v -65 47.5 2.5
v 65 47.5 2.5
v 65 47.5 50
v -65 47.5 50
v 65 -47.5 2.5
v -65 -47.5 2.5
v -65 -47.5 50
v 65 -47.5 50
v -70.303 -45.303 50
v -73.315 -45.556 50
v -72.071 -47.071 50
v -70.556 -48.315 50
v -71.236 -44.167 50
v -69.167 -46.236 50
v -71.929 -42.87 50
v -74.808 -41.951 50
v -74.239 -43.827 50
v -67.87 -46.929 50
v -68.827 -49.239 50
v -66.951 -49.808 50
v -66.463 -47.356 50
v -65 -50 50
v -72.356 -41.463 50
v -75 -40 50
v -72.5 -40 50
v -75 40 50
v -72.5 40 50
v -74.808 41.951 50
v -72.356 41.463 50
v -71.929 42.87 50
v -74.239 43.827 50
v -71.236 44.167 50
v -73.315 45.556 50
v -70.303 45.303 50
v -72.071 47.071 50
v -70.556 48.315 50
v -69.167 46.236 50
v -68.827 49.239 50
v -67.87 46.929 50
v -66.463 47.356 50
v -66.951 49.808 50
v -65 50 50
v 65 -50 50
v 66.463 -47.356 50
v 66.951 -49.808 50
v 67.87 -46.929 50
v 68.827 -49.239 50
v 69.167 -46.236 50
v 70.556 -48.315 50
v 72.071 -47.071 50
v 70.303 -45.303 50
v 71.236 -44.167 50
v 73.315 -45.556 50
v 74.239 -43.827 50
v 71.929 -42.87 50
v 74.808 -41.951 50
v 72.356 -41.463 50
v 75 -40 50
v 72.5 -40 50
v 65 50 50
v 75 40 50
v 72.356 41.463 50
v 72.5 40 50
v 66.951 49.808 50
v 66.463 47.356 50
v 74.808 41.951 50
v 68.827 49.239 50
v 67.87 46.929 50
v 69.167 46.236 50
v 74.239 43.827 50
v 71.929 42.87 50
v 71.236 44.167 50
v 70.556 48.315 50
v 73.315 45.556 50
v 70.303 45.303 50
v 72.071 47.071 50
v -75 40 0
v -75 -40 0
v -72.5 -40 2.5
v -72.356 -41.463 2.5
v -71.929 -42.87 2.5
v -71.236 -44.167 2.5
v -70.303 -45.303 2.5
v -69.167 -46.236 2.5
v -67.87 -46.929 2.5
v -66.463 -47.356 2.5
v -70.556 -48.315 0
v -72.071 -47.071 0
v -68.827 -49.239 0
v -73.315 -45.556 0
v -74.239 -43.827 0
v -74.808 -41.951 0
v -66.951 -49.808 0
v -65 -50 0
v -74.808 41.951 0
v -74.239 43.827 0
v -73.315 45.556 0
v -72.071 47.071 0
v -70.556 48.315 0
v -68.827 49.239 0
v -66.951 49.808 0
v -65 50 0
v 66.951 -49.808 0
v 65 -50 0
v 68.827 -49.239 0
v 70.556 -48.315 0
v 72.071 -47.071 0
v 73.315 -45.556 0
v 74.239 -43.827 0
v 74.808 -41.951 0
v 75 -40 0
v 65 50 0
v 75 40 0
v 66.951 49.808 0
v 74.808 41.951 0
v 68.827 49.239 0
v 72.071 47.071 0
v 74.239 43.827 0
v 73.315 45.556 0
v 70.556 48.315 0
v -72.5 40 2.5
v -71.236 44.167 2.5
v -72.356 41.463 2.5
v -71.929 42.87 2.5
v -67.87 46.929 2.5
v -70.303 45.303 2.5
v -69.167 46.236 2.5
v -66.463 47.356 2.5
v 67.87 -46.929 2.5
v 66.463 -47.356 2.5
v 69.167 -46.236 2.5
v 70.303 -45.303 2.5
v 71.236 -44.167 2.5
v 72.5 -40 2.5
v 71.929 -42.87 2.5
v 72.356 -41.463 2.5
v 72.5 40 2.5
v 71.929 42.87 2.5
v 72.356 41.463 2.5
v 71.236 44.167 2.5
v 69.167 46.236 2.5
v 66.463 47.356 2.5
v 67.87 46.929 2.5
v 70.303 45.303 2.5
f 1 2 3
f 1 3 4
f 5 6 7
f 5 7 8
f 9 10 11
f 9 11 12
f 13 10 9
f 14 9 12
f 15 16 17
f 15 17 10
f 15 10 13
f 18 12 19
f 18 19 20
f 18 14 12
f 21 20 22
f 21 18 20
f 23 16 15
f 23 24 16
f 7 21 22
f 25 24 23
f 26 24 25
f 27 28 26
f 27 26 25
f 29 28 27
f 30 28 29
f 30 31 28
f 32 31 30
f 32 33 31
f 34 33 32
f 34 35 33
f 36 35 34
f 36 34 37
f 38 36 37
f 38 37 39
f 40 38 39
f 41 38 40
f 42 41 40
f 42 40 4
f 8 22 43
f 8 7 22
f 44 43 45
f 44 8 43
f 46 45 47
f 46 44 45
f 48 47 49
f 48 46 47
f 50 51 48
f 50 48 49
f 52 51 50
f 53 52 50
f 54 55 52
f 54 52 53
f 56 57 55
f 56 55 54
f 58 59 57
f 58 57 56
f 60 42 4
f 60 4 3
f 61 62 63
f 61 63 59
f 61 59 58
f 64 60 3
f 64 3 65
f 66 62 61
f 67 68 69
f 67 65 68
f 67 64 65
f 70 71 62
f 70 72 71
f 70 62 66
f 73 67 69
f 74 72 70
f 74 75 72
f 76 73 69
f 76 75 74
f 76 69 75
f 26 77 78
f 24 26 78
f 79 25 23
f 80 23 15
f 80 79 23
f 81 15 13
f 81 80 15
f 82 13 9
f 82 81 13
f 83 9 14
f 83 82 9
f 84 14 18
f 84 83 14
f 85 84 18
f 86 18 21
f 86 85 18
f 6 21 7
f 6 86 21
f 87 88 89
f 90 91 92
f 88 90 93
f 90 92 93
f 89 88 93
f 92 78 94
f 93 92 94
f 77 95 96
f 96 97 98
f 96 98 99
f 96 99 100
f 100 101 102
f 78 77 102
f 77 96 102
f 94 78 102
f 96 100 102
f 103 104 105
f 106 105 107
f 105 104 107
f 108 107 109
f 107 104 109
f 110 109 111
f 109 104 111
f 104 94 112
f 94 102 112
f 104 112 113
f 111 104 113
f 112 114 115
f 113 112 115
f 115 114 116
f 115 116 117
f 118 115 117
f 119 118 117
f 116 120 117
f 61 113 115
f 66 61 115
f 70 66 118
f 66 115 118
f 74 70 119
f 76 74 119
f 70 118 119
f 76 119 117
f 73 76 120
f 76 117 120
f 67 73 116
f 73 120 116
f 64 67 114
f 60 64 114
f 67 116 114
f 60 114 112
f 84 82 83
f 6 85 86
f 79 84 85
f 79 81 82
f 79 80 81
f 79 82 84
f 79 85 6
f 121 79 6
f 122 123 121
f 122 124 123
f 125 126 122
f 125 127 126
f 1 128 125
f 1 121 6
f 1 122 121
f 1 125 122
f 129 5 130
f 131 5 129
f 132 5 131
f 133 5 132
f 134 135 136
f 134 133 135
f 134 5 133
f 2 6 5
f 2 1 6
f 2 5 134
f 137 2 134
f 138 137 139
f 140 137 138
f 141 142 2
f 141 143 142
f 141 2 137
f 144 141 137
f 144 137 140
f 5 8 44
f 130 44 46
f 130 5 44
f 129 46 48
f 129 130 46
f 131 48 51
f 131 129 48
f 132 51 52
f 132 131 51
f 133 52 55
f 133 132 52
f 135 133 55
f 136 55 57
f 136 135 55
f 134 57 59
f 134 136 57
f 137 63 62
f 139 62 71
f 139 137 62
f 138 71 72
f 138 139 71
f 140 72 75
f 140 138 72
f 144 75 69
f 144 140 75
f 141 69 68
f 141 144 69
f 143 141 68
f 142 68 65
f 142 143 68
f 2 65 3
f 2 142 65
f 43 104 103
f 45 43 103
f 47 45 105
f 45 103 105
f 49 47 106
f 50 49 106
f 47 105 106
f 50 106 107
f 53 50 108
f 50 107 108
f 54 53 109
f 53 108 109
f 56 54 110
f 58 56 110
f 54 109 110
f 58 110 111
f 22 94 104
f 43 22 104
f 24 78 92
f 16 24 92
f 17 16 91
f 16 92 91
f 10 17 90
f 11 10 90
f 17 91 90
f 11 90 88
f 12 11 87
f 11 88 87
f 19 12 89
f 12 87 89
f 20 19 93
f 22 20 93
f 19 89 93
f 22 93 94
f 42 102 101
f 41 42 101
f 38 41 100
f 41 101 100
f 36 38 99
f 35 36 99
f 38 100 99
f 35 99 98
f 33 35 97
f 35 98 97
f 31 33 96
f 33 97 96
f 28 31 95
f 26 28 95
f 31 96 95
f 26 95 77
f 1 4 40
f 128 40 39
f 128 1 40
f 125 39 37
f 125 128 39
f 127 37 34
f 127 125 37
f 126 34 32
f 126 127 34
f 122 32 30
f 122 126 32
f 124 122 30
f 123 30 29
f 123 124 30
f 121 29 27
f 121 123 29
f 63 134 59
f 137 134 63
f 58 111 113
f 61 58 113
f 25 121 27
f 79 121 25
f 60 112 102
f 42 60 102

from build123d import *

# Parameters (mm, degrees)
F1_DEPTH = 50
F2_T     = -2.5


with BuildPart() as f1:
    # F0 (on Top) → F1 (new body)
    with BuildSketch(Plane.XY):
        with BuildLine():
            Line((-65, -50), (65, -50))
            ThreePointArc((65, -50), (72.071068, -47.071068), (75, -40))
            Line((75, -40), (75, 40))
            ThreePointArc((75, 40), (72.071068, 47.071068), (65, 50))
            Line((65, 50), (-65, 50))
            ThreePointArc((-65, 50), (-72.071068, 47.071068), (-75, 40))
            Line((-75, 40), (-75, -40))
            ThreePointArc((-75, -40), (-72.071068, -47.071068), (-65, -50))
        make_face()
    extrude(amount=F1_DEPTH)

    # F2
    f2_openings = [f1.faces().sort_by_distance(p)[0] for p in [
        (0, 0, 50),
    ]]
    offset(amount=F2_T, openings=f2_openings)


solid = f1.part
